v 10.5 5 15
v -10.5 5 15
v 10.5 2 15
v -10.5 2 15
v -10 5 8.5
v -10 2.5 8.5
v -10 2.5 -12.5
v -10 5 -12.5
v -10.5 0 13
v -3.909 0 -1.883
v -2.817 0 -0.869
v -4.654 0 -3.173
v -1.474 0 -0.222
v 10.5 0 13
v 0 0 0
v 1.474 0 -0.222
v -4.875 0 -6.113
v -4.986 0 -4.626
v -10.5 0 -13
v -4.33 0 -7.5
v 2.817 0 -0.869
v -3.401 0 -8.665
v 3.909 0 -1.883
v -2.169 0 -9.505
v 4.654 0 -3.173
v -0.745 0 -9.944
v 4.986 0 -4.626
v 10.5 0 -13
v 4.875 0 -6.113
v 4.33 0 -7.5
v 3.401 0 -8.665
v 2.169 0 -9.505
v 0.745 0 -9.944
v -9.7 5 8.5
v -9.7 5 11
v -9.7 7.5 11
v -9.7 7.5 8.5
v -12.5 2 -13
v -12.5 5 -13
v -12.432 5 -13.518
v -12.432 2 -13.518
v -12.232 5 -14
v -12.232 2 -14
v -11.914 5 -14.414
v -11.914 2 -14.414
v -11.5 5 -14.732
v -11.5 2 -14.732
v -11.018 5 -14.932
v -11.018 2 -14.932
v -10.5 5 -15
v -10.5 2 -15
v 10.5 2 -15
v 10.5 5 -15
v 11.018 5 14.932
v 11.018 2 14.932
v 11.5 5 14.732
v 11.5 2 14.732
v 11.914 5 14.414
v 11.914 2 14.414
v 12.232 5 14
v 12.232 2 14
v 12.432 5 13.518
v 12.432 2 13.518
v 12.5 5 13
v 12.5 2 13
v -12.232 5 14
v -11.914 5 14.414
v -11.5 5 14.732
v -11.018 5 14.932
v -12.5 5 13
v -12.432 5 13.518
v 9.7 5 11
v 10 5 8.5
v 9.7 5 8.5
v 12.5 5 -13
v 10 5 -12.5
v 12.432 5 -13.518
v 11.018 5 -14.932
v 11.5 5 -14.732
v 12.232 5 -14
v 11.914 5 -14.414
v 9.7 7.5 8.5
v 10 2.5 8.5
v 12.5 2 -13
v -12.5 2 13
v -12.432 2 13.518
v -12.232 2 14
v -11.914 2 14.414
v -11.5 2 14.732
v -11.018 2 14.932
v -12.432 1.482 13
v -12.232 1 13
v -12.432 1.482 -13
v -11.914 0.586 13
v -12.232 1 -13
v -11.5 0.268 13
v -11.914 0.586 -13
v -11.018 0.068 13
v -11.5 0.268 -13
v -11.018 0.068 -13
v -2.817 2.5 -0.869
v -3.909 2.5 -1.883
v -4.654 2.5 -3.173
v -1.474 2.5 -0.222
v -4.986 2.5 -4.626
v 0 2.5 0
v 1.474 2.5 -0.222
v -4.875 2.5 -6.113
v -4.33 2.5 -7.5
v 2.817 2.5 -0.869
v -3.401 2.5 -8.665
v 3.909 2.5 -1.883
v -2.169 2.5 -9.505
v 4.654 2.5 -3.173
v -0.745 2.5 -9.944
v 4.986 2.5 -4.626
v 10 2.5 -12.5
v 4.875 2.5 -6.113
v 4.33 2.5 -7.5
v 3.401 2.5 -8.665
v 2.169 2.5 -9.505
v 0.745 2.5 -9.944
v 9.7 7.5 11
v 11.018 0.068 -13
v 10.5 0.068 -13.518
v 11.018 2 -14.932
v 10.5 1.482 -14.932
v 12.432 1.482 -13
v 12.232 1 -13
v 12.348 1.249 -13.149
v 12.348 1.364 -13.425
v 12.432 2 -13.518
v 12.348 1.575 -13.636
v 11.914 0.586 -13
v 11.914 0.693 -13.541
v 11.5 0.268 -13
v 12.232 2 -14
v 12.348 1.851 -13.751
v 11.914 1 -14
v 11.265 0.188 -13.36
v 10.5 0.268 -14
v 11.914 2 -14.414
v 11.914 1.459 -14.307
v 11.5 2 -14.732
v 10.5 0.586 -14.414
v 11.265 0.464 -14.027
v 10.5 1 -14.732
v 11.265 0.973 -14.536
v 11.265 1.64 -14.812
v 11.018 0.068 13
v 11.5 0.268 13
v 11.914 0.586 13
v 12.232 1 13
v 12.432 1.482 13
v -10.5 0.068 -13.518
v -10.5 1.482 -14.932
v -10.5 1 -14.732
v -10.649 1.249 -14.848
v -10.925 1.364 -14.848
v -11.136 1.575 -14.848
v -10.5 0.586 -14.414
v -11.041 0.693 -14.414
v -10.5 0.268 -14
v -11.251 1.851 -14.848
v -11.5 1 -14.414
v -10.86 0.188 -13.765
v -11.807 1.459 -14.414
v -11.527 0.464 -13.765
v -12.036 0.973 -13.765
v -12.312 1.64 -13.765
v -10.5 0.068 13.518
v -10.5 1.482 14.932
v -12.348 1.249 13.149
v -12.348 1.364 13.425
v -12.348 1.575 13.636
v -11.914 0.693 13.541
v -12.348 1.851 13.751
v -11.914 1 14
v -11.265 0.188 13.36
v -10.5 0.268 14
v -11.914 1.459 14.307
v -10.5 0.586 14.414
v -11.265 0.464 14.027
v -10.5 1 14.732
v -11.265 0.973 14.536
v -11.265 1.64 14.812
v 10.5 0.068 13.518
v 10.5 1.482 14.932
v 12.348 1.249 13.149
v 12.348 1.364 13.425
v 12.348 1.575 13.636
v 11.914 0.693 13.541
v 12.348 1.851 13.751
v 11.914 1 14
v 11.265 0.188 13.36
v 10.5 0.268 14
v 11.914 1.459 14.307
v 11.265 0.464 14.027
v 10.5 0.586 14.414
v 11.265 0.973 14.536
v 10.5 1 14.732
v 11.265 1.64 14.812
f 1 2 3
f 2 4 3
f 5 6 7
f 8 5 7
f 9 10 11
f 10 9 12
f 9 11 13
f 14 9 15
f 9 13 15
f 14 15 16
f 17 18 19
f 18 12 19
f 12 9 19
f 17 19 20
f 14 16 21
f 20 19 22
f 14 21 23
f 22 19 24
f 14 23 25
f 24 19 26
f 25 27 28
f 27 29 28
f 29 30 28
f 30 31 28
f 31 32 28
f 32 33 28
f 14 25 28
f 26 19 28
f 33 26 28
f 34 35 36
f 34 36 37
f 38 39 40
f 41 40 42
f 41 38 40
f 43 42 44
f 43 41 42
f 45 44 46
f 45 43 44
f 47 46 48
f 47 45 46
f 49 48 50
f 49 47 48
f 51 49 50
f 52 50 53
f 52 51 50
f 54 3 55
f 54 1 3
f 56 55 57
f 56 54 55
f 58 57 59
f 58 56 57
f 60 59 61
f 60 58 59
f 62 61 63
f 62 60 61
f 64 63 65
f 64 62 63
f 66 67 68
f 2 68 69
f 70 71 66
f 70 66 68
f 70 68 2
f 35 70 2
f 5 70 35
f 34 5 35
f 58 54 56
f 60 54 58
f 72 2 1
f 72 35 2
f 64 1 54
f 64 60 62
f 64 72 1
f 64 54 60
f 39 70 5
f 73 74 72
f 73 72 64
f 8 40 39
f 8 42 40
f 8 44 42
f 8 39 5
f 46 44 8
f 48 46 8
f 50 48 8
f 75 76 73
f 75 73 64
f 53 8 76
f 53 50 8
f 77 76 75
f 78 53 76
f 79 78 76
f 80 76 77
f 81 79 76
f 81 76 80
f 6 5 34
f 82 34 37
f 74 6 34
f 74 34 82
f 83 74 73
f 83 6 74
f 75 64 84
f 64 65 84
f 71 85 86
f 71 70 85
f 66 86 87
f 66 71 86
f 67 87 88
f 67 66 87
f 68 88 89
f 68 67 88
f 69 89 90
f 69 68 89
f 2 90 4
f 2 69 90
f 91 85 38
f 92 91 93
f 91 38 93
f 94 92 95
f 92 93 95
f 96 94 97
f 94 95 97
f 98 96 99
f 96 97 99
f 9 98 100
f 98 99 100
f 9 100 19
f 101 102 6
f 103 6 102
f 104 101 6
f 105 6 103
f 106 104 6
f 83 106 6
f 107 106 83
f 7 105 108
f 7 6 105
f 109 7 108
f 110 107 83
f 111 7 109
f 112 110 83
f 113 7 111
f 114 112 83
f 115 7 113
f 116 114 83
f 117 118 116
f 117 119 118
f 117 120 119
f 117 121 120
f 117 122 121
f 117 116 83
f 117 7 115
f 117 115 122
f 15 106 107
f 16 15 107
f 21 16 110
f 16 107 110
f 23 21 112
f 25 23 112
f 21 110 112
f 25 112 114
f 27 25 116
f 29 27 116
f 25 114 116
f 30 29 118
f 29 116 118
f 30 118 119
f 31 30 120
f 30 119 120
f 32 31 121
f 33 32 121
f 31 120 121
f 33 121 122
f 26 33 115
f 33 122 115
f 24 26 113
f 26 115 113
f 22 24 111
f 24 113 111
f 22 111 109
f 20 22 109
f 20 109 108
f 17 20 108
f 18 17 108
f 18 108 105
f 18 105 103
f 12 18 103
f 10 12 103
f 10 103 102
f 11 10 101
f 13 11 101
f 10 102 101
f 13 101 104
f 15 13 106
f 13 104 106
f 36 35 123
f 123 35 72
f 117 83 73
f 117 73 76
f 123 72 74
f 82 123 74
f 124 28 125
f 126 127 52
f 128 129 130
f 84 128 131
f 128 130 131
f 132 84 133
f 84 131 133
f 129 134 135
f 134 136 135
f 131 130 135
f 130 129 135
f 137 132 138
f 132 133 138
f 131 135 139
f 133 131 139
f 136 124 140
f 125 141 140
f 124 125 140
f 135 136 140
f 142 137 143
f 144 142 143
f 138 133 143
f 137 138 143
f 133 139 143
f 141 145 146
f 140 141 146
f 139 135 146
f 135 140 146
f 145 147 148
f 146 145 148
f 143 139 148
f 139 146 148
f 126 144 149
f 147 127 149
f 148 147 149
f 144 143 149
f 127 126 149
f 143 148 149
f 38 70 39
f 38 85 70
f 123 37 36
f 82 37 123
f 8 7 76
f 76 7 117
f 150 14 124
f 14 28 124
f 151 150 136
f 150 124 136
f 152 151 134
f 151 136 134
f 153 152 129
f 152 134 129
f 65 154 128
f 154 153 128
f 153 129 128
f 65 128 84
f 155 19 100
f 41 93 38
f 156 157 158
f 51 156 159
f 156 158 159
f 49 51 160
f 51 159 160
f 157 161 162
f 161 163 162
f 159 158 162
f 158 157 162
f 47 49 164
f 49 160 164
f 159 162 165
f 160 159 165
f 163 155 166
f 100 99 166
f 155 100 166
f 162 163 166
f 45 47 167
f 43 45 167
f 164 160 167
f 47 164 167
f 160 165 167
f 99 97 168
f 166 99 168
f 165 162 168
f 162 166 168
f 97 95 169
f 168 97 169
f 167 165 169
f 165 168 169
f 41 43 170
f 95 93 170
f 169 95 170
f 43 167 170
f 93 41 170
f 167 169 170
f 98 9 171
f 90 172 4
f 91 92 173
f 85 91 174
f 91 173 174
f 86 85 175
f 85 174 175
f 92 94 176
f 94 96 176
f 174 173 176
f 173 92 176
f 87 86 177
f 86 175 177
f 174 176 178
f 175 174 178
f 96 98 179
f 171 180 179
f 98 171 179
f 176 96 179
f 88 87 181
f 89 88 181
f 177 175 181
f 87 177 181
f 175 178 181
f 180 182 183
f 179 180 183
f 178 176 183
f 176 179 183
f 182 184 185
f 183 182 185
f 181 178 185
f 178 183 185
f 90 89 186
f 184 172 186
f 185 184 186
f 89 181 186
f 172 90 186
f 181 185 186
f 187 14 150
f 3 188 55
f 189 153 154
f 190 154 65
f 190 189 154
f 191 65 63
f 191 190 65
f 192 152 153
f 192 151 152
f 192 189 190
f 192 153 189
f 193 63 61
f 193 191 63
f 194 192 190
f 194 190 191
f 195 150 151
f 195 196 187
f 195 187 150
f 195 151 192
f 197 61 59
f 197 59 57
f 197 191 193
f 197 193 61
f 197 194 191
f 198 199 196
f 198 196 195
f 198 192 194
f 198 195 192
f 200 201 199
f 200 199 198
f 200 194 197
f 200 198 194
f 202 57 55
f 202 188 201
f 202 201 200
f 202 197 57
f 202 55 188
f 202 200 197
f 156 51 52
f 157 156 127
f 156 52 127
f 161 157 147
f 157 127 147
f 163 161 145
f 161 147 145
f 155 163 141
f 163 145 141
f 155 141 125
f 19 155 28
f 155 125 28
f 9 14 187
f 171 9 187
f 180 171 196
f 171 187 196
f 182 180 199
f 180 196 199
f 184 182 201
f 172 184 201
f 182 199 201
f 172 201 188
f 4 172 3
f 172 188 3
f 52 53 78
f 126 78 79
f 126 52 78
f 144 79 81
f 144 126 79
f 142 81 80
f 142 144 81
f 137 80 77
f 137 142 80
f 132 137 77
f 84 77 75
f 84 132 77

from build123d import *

# Parameters (mm, degrees)
SKETCH1_W           = 25
SKETCH1_H           = 30
BOSS_EXTRUDE1_DEPTH = 2.5
SKETCH3_W           = 25
SKETCH3_H           = 30
SKETCH3_W_2         = 20
SKETCH3_H_2         = 21
BOSS_EXTRUDE2_DEPTH = 2.5
SKETCH5_R           = 5
CUT_EXTRUDE1_DEPTH  = 2.5
FILLET2_R           = 2
SKETCH6_W           = 19.4
SKETCH6_H           = 2.5
BOSS_EXTRUDE4_DEPTH = 2.5


with BuildPart() as part:
    # Sketch1 → Boss-Extrude1 (new body)
    with BuildSketch(Plane(origin=(0, 0, 0), x_dir=(1, 0, 0), z_dir=(0, 1, 0))):
        Rectangle(SKETCH1_W, SKETCH1_H)
    extrude(amount=BOSS_EXTRUDE1_DEPTH)

    # Sketch3 → Boss-Extrude2 (add)
    with BuildSketch(Plane(origin=(0, 2.5, 0), x_dir=(1, 0, 0), z_dir=(0, 1, 0))):
        Rectangle(SKETCH3_W, SKETCH3_H)
        with Locations((0, 2)):
            Rectangle(SKETCH3_W_2, SKETCH3_H_2, mode=Mode.SUBTRACT)
    extrude(amount=BOSS_EXTRUDE2_DEPTH)

    # Sketch5 → Cut-Extrude1 (cut)
    with BuildSketch(Plane(origin=(0, 2.5, 0), x_dir=(1, 0, 0), z_dir=(0, 1, 0))):
        with Locations(Location((0, 5, 0), (0, 0, 270))):  # turned: the seam where the file's is
            Circle(SKETCH5_R)
    extrude(amount=-CUT_EXTRUDE1_DEPTH, mode=Mode.SUBTRACT)

    # Fillet2
    fillet2_edges = [part.edges().sort_by_distance(p)[0] for p in [
        (0, 0, 15),
        (-12.5, 0, 0),
        (0, 0, -15),
        (12.5, 0, 0),
        (12.5, 2.5, 15),
        (-12.5, 2.5, 15),
        (-12.5, 2.5, -15),
        (12.5, 2.5, -15),
    ]]
    fillet(fillet2_edges, radius=FILLET2_R)

    # Sketch6 → Boss-Extrude4 (add)
    with BuildSketch(Plane(origin=(0, 5, 0), x_dir=(1, 0, 0), z_dir=(0, 1, 0))):
        with Locations((0, -9.75)):
            Rectangle(SKETCH6_W, SKETCH6_H)
    extrude(amount=BOSS_EXTRUDE4_DEPTH)


solid = part.part
